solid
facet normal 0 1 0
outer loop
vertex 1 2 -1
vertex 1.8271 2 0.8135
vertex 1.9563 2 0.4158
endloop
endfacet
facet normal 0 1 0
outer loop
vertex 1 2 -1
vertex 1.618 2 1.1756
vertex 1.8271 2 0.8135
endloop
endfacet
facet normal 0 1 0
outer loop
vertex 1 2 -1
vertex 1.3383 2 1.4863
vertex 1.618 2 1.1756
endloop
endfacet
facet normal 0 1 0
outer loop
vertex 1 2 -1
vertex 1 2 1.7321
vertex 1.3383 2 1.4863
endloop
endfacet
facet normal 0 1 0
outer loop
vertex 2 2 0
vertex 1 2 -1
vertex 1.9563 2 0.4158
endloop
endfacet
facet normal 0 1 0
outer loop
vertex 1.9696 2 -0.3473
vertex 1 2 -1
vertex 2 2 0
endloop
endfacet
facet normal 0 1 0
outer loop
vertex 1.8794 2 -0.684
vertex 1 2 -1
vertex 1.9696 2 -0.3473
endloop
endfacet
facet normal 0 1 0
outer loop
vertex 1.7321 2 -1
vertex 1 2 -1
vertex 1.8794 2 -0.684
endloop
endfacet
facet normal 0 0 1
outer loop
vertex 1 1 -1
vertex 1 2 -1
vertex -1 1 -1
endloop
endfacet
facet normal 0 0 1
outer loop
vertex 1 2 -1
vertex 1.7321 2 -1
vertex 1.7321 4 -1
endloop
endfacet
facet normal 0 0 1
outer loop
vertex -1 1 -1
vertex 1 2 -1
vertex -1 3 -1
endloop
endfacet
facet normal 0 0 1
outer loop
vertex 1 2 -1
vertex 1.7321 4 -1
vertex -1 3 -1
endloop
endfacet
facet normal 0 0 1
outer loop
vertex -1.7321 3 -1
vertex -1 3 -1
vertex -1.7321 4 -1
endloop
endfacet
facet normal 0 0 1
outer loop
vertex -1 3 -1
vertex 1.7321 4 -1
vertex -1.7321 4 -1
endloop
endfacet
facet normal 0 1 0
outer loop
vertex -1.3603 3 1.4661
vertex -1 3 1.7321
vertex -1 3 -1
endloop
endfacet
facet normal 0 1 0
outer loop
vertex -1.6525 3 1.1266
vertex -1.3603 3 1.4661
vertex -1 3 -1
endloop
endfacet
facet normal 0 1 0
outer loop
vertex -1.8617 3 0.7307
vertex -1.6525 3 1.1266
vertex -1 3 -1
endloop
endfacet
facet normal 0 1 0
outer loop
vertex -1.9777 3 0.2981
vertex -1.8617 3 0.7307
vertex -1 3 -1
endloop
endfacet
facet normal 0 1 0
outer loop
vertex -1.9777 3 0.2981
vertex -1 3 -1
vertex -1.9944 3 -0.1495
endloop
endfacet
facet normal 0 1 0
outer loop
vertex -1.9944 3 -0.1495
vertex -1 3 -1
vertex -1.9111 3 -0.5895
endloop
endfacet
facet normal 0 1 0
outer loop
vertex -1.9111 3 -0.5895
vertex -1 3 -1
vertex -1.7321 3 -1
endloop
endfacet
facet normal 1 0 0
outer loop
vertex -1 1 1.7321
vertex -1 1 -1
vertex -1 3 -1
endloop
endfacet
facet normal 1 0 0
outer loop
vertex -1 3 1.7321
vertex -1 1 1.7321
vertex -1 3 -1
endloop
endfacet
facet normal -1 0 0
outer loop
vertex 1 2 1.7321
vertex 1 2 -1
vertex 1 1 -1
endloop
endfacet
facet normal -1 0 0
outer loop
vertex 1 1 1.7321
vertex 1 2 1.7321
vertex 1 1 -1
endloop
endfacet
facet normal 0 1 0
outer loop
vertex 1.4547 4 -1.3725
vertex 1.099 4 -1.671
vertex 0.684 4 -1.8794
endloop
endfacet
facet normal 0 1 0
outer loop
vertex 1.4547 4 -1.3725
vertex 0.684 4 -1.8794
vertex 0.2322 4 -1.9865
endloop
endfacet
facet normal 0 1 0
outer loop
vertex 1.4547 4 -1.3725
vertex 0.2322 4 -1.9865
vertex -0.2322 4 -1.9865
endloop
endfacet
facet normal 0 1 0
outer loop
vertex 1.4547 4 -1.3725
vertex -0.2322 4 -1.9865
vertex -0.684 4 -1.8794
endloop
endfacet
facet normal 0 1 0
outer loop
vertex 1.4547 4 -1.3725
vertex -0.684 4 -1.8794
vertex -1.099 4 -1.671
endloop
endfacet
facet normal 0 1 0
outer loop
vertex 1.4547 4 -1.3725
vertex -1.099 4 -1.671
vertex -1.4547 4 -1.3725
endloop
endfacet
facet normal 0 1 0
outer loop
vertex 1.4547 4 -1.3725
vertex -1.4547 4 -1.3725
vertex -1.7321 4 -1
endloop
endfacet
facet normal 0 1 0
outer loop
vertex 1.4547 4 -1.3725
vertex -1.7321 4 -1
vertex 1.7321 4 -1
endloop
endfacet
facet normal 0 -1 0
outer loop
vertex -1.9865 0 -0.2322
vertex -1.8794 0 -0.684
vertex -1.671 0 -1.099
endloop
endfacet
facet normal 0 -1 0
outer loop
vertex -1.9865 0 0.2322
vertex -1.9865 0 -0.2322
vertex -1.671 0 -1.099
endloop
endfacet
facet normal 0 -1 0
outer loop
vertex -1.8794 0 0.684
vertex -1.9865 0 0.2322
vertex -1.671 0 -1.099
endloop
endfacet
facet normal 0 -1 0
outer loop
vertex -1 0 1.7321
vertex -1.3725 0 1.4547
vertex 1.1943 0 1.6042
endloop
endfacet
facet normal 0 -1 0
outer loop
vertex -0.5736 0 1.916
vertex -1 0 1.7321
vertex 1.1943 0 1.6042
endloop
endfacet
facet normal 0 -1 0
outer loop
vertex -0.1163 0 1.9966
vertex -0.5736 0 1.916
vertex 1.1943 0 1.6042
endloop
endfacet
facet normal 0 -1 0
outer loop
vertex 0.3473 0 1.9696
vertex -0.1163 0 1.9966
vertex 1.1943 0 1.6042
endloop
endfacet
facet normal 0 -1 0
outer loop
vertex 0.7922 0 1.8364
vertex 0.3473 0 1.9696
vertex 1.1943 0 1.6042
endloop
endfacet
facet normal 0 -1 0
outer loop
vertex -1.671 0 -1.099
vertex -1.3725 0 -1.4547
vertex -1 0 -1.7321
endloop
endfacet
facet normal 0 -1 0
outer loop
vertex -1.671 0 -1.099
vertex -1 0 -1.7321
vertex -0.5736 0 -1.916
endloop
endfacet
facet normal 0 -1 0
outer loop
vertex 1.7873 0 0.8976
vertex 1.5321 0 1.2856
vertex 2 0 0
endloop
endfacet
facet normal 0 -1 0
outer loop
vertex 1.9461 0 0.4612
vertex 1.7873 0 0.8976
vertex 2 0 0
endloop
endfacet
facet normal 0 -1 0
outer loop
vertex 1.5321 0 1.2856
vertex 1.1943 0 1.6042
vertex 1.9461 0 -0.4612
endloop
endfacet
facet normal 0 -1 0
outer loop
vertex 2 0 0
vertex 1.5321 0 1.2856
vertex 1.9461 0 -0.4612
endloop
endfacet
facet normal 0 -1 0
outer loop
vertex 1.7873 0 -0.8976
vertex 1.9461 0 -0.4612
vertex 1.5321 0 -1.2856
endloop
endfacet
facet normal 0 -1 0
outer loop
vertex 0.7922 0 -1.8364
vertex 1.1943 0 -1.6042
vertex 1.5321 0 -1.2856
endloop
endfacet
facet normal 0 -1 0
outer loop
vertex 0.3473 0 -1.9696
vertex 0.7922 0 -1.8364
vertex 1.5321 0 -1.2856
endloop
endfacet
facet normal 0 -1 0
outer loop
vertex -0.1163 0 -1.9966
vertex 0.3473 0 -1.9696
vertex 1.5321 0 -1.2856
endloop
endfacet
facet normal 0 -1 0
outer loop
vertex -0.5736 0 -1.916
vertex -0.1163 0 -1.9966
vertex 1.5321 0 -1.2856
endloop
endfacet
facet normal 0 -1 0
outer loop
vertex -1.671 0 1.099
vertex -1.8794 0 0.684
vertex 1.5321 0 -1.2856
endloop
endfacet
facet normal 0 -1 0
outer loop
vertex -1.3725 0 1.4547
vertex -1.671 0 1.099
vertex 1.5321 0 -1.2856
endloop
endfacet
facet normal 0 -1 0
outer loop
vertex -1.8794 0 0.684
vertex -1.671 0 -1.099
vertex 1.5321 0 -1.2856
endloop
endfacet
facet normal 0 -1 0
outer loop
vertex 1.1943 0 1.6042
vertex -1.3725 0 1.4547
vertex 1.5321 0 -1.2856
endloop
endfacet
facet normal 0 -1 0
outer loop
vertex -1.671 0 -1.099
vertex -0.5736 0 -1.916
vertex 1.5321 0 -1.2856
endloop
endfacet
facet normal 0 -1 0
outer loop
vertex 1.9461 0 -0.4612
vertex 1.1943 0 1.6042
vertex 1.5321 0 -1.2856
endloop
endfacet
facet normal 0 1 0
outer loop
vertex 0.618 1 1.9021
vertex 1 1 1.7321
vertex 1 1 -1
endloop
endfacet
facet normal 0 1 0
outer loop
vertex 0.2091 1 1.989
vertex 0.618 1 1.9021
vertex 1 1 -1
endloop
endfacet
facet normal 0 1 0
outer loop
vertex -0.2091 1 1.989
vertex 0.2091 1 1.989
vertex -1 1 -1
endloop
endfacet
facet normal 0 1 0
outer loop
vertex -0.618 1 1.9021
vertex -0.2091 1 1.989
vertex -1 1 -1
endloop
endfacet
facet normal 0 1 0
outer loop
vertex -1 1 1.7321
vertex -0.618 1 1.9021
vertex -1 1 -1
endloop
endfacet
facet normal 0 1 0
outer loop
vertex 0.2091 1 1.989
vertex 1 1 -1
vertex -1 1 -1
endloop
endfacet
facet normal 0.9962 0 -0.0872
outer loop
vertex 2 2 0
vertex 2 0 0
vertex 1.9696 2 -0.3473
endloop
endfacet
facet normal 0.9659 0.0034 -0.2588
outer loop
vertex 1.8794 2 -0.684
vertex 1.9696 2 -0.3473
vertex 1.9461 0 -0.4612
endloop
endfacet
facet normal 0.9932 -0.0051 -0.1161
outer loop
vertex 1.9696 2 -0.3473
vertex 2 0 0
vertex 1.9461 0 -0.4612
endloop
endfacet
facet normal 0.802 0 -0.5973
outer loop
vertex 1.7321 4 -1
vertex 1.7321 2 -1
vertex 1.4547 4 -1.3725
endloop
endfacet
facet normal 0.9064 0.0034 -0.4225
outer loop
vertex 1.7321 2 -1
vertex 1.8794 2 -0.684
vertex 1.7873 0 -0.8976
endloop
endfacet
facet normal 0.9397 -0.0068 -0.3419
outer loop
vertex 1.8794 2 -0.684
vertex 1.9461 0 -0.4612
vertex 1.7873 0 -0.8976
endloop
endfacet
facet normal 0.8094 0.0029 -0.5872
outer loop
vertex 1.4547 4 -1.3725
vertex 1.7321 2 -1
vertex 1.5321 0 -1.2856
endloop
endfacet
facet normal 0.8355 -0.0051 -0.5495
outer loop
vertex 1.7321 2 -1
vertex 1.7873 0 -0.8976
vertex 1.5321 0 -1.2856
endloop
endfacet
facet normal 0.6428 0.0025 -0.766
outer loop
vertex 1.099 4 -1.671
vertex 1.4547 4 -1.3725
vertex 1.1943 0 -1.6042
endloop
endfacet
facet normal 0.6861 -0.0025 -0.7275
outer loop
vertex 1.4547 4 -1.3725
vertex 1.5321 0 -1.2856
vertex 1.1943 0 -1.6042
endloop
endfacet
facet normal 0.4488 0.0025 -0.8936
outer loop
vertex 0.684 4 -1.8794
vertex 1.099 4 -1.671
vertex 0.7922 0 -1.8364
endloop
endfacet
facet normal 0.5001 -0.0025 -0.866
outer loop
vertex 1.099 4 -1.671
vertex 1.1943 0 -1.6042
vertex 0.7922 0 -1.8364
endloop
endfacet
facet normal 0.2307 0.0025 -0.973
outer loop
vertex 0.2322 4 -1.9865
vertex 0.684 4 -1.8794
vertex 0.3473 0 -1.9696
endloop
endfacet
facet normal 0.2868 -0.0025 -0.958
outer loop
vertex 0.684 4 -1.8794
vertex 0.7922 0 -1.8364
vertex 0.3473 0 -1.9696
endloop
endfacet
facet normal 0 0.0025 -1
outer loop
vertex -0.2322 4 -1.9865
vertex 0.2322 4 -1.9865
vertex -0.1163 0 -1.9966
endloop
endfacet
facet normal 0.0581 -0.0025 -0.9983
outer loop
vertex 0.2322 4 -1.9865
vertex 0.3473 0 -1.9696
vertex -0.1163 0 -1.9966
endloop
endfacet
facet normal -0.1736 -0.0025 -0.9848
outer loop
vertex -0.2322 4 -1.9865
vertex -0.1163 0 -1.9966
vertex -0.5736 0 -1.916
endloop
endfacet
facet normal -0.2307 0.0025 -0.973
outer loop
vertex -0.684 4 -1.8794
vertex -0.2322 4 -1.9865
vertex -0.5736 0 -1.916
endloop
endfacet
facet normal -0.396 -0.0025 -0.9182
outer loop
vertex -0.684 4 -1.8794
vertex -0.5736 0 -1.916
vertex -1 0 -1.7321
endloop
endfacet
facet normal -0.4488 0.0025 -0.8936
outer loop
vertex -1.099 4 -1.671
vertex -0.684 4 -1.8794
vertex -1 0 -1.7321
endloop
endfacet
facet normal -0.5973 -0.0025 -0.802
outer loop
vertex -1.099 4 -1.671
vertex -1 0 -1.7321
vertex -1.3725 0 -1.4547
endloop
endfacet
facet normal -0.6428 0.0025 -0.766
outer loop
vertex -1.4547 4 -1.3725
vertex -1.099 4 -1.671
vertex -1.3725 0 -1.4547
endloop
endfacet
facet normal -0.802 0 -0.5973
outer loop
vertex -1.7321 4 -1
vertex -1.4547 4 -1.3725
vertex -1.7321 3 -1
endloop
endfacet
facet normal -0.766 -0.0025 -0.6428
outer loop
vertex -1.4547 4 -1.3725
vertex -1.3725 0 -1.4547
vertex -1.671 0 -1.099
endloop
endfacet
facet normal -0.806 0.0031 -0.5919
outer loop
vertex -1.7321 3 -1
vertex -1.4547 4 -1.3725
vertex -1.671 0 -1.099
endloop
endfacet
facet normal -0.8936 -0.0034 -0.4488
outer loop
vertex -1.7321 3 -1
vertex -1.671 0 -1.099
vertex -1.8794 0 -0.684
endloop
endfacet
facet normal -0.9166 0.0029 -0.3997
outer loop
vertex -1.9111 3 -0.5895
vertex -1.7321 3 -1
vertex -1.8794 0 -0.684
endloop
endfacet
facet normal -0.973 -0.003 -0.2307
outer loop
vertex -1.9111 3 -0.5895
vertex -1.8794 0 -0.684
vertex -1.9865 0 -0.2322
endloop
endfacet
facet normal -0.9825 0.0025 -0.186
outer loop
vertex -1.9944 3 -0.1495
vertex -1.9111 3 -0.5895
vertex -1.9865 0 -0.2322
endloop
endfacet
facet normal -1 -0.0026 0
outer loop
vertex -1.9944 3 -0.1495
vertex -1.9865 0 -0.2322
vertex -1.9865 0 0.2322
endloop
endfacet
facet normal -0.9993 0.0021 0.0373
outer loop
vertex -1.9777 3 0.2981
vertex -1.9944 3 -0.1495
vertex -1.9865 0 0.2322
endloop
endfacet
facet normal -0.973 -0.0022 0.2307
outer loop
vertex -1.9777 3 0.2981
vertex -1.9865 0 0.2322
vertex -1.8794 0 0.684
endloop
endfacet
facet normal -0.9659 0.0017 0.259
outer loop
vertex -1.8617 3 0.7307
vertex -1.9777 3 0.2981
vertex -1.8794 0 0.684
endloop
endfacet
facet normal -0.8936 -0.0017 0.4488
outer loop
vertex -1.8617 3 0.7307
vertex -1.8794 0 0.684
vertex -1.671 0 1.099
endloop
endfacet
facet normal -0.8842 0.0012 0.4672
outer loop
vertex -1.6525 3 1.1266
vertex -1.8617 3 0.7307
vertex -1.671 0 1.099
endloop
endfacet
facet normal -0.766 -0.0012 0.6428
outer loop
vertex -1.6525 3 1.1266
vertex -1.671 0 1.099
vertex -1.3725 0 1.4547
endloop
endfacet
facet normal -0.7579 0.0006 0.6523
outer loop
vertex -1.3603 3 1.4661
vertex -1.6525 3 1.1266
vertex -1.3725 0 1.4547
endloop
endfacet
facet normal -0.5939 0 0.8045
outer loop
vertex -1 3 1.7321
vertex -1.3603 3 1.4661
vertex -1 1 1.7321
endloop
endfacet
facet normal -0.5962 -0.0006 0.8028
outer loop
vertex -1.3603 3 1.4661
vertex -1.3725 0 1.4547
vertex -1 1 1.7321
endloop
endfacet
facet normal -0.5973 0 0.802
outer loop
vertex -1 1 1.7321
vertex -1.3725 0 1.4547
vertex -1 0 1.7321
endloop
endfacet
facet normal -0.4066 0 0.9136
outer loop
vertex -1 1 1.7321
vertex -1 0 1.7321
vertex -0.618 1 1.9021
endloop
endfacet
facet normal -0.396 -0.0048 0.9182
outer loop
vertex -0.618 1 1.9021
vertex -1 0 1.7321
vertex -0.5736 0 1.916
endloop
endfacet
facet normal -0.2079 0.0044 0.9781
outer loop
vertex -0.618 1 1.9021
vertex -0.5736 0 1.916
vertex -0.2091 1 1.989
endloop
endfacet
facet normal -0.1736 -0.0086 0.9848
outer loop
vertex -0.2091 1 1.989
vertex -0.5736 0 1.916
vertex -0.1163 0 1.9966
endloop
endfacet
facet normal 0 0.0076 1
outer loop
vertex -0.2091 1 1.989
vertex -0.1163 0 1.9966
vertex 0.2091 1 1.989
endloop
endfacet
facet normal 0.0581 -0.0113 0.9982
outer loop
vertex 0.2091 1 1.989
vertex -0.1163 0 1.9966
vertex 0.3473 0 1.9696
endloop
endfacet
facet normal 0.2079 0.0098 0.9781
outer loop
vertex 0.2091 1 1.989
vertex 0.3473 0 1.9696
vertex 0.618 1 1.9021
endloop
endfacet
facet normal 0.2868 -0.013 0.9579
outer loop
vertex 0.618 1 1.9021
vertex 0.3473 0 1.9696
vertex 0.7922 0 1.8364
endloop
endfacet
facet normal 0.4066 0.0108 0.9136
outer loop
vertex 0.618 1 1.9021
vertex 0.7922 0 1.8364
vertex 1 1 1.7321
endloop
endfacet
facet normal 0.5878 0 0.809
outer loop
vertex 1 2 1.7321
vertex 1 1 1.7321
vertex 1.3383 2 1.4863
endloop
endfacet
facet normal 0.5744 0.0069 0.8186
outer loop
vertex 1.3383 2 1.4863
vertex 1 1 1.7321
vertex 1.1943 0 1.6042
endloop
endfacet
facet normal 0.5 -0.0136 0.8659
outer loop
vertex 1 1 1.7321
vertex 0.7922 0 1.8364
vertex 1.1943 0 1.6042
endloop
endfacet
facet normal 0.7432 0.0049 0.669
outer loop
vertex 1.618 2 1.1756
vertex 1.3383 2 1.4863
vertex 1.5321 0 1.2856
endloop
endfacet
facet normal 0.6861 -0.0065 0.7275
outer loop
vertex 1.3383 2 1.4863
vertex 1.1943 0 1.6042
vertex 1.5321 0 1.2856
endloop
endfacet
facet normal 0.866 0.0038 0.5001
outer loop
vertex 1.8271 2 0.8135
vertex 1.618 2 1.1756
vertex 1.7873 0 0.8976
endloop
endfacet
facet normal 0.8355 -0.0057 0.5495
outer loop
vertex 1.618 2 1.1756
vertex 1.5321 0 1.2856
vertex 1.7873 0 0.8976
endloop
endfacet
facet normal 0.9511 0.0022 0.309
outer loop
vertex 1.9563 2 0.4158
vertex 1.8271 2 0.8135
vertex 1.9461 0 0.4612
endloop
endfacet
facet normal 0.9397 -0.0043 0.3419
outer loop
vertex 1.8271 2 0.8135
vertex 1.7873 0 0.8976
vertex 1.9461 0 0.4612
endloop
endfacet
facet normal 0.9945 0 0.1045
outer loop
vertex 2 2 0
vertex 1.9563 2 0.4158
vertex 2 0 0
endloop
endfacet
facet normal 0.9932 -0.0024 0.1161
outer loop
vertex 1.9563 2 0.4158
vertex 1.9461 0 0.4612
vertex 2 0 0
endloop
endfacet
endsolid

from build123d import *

# Parameters (mm, degrees)
SKETCH1_R               = 2
BOSS_EXTRUDE1_DEPTH     = 4
CUT_EXTRUDE1_DEPTH      = 3
CUT_EXTRUDE1_DEPTH_BACK = 1
SKETCH3_W               = 1
SKETCH3_H               = 1
CUT_EXTRUDE2_DEPTH      = 10


with BuildPart() as part:
    # Sketch1 → Boss-Extrude1 (new body)
    with BuildSketch(Plane(origin=(0, 0, 0), x_dir=(1, 0, 0), z_dir=(0, 1, 0))):
        Circle(SKETCH1_R)
    extrude(amount=BOSS_EXTRUDE1_DEPTH)

    # Sketch2 → Cut-Extrude1 (cut, two sides)
    with BuildSketch(Plane.XY) as cut_extrude1_sk:
        Polygon((-2, 4), (2, 4), (2, 3), (1, 3), (1, 1), (-1, 1), (-1, 3), (-2, 3), align=None)
    extrude(amount=CUT_EXTRUDE1_DEPTH, mode=Mode.SUBTRACT)
    extrude(cut_extrude1_sk.sketch, amount=-CUT_EXTRUDE1_DEPTH_BACK, mode=Mode.SUBTRACT)

    # Sketch3 → Cut-Extrude2 (cut)
    with BuildSketch(Plane.XY.offset(-1)):
        with Locations((1.5, 2.5)):
            Rectangle(SKETCH3_W, SKETCH3_H)
    extrude(amount=CUT_EXTRUDE2_DEPTH, mode=Mode.SUBTRACT)


solid = part.part
